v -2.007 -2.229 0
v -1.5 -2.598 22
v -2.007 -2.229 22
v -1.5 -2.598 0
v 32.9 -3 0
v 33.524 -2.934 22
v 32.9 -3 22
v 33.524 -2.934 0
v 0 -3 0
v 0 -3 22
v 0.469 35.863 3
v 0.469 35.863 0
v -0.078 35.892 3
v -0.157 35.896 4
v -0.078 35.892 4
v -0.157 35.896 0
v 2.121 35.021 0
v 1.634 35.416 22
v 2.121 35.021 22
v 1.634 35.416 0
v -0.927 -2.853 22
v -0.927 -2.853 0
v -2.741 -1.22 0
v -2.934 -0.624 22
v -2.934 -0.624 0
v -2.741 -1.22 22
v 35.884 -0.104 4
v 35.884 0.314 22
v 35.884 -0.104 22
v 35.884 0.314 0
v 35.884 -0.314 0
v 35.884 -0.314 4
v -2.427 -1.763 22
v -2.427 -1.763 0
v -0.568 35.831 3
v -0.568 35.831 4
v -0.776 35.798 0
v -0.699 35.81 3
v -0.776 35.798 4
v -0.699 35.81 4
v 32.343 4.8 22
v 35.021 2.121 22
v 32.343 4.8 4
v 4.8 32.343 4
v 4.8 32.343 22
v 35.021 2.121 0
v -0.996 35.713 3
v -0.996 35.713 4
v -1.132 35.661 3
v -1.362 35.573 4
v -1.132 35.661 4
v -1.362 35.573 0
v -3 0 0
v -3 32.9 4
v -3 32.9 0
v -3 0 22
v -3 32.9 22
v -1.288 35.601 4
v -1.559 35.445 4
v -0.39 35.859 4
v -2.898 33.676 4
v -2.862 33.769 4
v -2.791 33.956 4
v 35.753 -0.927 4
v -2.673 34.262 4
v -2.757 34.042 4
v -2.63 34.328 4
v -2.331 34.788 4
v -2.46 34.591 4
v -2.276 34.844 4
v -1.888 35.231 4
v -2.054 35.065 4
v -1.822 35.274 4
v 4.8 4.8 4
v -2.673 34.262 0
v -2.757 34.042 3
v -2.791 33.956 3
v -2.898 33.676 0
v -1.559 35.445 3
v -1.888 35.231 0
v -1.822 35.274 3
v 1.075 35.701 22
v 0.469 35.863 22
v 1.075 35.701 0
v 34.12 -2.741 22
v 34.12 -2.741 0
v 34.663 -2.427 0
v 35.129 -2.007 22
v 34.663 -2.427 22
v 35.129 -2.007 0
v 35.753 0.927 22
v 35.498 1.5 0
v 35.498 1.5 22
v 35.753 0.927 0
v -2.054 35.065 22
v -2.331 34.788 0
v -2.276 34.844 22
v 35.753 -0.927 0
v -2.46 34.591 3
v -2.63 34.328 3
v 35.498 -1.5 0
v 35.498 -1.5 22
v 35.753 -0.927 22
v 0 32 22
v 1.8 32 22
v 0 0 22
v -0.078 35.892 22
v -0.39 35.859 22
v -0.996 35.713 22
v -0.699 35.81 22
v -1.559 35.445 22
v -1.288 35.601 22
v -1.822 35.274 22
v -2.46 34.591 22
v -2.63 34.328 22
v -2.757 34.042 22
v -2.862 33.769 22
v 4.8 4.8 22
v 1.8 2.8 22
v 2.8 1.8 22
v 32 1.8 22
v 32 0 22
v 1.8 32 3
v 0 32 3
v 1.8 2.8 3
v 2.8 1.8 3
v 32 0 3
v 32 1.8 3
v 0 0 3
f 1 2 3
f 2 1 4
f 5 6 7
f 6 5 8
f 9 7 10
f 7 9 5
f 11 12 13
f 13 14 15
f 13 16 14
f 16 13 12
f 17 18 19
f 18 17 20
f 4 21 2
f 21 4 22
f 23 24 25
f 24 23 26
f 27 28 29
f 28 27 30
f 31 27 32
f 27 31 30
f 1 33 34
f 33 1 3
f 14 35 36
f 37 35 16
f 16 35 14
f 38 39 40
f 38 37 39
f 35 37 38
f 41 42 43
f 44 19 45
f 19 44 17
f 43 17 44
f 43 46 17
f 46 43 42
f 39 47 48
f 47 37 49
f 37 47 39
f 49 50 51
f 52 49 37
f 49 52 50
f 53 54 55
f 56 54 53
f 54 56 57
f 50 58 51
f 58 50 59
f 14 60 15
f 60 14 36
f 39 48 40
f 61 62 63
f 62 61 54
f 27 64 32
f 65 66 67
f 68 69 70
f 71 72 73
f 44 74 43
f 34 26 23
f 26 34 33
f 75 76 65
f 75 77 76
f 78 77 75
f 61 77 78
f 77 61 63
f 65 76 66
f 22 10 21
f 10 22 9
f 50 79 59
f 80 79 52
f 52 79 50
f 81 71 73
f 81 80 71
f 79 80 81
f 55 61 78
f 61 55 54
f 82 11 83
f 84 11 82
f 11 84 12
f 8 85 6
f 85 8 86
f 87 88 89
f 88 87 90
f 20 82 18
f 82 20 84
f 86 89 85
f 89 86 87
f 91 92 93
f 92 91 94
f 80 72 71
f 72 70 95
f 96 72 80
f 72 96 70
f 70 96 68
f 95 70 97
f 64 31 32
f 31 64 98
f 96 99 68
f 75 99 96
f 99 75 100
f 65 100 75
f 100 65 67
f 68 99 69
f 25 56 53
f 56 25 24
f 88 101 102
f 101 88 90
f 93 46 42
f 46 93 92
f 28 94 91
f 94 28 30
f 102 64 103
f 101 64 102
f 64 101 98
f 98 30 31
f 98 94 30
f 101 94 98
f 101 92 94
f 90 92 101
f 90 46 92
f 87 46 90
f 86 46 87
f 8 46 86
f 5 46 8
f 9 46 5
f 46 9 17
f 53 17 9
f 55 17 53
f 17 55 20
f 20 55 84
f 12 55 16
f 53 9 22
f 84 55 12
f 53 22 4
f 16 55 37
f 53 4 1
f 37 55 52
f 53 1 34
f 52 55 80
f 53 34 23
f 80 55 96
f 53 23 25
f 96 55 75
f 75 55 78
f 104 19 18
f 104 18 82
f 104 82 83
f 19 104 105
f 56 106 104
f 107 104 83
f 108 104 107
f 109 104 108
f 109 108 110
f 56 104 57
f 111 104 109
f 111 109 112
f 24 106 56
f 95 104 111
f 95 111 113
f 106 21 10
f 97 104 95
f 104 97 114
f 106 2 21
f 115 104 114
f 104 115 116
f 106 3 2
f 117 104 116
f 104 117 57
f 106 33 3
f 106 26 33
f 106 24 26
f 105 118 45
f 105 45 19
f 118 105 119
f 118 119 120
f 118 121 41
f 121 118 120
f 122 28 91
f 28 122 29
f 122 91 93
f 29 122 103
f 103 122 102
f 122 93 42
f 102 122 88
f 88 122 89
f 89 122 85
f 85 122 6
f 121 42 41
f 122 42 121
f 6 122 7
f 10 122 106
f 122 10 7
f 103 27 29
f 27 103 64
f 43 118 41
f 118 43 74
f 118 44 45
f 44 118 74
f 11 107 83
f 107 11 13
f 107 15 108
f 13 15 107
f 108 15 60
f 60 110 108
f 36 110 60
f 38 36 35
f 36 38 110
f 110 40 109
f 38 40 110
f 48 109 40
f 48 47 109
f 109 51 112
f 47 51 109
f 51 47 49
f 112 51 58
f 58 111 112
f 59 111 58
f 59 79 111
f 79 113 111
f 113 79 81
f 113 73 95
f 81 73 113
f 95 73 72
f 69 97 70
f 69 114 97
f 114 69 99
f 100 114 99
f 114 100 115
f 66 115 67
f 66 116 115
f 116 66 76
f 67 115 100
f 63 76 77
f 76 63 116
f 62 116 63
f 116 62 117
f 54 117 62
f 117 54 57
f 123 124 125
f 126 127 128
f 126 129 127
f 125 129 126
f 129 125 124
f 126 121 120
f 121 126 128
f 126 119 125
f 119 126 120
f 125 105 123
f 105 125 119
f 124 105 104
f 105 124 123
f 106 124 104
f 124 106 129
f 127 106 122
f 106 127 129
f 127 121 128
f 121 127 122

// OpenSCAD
// super simple feet for metal shelving
// Created 2017 Clinton Ebadi <clinton@unknownlamer.org>

// Released under the https://wiki.creativecommons.org/wiki/CC0
// To the extent possible under law, Clinton Ebadi has waived all
// copyright and related or neighboring rights to super simple feet
// for metal shelving.


// preview[view:east, tilt:top diagonal]

// Length of slot for shelving leg
slot_length = 32;
// Thickness of slot for shelving leg
slot_thickness = 1.8;

// Thickness of wall around slot
wall_thickness = 3;

// Depth of the base foot
base_depth = 4;
// Depth of the slot and walls around the length
slot_depth = 20;
// Offset for leg slot into the base
slot_offset = -1;

$fs = 0.1;

foot ();

module base () {
    side = slot_length + slot_thickness/2;
    offset (r = wall_thickness) polygon ([ [0, 0], [ side , 0], [0, side] ]);
}

module walls () {
     intersection () {
	  offset (r = wall_thickness) {
	       square ([slot_thickness, slot_length + slot_thickness/2]);
	       square ([slot_length + slot_thickness/2, slot_thickness]);
	  }
	  base ();
     }
}

module slot () {
     square ([slot_thickness, slot_length]);
     square ([slot_length, slot_thickness]);

     // tiny chamfer around bend
     x = 2;
     polygon ([ [0, 0], [ slot_thickness*2+x/2, 0], [0, slot_thickness*2+x/2] ]);
}


module foot () {
     difference () {
	  union () {
	       linear_extrude (base_depth) base ();
	       translate ([0, 0, base_depth+slot_offset]) linear_extrude (slot_depth+slot_offset) walls ();
	  }
	  translate ([0, 0, base_depth+slot_offset]) linear_extrude (slot_depth+slot_offset+0.1) slot ();
     }
}
